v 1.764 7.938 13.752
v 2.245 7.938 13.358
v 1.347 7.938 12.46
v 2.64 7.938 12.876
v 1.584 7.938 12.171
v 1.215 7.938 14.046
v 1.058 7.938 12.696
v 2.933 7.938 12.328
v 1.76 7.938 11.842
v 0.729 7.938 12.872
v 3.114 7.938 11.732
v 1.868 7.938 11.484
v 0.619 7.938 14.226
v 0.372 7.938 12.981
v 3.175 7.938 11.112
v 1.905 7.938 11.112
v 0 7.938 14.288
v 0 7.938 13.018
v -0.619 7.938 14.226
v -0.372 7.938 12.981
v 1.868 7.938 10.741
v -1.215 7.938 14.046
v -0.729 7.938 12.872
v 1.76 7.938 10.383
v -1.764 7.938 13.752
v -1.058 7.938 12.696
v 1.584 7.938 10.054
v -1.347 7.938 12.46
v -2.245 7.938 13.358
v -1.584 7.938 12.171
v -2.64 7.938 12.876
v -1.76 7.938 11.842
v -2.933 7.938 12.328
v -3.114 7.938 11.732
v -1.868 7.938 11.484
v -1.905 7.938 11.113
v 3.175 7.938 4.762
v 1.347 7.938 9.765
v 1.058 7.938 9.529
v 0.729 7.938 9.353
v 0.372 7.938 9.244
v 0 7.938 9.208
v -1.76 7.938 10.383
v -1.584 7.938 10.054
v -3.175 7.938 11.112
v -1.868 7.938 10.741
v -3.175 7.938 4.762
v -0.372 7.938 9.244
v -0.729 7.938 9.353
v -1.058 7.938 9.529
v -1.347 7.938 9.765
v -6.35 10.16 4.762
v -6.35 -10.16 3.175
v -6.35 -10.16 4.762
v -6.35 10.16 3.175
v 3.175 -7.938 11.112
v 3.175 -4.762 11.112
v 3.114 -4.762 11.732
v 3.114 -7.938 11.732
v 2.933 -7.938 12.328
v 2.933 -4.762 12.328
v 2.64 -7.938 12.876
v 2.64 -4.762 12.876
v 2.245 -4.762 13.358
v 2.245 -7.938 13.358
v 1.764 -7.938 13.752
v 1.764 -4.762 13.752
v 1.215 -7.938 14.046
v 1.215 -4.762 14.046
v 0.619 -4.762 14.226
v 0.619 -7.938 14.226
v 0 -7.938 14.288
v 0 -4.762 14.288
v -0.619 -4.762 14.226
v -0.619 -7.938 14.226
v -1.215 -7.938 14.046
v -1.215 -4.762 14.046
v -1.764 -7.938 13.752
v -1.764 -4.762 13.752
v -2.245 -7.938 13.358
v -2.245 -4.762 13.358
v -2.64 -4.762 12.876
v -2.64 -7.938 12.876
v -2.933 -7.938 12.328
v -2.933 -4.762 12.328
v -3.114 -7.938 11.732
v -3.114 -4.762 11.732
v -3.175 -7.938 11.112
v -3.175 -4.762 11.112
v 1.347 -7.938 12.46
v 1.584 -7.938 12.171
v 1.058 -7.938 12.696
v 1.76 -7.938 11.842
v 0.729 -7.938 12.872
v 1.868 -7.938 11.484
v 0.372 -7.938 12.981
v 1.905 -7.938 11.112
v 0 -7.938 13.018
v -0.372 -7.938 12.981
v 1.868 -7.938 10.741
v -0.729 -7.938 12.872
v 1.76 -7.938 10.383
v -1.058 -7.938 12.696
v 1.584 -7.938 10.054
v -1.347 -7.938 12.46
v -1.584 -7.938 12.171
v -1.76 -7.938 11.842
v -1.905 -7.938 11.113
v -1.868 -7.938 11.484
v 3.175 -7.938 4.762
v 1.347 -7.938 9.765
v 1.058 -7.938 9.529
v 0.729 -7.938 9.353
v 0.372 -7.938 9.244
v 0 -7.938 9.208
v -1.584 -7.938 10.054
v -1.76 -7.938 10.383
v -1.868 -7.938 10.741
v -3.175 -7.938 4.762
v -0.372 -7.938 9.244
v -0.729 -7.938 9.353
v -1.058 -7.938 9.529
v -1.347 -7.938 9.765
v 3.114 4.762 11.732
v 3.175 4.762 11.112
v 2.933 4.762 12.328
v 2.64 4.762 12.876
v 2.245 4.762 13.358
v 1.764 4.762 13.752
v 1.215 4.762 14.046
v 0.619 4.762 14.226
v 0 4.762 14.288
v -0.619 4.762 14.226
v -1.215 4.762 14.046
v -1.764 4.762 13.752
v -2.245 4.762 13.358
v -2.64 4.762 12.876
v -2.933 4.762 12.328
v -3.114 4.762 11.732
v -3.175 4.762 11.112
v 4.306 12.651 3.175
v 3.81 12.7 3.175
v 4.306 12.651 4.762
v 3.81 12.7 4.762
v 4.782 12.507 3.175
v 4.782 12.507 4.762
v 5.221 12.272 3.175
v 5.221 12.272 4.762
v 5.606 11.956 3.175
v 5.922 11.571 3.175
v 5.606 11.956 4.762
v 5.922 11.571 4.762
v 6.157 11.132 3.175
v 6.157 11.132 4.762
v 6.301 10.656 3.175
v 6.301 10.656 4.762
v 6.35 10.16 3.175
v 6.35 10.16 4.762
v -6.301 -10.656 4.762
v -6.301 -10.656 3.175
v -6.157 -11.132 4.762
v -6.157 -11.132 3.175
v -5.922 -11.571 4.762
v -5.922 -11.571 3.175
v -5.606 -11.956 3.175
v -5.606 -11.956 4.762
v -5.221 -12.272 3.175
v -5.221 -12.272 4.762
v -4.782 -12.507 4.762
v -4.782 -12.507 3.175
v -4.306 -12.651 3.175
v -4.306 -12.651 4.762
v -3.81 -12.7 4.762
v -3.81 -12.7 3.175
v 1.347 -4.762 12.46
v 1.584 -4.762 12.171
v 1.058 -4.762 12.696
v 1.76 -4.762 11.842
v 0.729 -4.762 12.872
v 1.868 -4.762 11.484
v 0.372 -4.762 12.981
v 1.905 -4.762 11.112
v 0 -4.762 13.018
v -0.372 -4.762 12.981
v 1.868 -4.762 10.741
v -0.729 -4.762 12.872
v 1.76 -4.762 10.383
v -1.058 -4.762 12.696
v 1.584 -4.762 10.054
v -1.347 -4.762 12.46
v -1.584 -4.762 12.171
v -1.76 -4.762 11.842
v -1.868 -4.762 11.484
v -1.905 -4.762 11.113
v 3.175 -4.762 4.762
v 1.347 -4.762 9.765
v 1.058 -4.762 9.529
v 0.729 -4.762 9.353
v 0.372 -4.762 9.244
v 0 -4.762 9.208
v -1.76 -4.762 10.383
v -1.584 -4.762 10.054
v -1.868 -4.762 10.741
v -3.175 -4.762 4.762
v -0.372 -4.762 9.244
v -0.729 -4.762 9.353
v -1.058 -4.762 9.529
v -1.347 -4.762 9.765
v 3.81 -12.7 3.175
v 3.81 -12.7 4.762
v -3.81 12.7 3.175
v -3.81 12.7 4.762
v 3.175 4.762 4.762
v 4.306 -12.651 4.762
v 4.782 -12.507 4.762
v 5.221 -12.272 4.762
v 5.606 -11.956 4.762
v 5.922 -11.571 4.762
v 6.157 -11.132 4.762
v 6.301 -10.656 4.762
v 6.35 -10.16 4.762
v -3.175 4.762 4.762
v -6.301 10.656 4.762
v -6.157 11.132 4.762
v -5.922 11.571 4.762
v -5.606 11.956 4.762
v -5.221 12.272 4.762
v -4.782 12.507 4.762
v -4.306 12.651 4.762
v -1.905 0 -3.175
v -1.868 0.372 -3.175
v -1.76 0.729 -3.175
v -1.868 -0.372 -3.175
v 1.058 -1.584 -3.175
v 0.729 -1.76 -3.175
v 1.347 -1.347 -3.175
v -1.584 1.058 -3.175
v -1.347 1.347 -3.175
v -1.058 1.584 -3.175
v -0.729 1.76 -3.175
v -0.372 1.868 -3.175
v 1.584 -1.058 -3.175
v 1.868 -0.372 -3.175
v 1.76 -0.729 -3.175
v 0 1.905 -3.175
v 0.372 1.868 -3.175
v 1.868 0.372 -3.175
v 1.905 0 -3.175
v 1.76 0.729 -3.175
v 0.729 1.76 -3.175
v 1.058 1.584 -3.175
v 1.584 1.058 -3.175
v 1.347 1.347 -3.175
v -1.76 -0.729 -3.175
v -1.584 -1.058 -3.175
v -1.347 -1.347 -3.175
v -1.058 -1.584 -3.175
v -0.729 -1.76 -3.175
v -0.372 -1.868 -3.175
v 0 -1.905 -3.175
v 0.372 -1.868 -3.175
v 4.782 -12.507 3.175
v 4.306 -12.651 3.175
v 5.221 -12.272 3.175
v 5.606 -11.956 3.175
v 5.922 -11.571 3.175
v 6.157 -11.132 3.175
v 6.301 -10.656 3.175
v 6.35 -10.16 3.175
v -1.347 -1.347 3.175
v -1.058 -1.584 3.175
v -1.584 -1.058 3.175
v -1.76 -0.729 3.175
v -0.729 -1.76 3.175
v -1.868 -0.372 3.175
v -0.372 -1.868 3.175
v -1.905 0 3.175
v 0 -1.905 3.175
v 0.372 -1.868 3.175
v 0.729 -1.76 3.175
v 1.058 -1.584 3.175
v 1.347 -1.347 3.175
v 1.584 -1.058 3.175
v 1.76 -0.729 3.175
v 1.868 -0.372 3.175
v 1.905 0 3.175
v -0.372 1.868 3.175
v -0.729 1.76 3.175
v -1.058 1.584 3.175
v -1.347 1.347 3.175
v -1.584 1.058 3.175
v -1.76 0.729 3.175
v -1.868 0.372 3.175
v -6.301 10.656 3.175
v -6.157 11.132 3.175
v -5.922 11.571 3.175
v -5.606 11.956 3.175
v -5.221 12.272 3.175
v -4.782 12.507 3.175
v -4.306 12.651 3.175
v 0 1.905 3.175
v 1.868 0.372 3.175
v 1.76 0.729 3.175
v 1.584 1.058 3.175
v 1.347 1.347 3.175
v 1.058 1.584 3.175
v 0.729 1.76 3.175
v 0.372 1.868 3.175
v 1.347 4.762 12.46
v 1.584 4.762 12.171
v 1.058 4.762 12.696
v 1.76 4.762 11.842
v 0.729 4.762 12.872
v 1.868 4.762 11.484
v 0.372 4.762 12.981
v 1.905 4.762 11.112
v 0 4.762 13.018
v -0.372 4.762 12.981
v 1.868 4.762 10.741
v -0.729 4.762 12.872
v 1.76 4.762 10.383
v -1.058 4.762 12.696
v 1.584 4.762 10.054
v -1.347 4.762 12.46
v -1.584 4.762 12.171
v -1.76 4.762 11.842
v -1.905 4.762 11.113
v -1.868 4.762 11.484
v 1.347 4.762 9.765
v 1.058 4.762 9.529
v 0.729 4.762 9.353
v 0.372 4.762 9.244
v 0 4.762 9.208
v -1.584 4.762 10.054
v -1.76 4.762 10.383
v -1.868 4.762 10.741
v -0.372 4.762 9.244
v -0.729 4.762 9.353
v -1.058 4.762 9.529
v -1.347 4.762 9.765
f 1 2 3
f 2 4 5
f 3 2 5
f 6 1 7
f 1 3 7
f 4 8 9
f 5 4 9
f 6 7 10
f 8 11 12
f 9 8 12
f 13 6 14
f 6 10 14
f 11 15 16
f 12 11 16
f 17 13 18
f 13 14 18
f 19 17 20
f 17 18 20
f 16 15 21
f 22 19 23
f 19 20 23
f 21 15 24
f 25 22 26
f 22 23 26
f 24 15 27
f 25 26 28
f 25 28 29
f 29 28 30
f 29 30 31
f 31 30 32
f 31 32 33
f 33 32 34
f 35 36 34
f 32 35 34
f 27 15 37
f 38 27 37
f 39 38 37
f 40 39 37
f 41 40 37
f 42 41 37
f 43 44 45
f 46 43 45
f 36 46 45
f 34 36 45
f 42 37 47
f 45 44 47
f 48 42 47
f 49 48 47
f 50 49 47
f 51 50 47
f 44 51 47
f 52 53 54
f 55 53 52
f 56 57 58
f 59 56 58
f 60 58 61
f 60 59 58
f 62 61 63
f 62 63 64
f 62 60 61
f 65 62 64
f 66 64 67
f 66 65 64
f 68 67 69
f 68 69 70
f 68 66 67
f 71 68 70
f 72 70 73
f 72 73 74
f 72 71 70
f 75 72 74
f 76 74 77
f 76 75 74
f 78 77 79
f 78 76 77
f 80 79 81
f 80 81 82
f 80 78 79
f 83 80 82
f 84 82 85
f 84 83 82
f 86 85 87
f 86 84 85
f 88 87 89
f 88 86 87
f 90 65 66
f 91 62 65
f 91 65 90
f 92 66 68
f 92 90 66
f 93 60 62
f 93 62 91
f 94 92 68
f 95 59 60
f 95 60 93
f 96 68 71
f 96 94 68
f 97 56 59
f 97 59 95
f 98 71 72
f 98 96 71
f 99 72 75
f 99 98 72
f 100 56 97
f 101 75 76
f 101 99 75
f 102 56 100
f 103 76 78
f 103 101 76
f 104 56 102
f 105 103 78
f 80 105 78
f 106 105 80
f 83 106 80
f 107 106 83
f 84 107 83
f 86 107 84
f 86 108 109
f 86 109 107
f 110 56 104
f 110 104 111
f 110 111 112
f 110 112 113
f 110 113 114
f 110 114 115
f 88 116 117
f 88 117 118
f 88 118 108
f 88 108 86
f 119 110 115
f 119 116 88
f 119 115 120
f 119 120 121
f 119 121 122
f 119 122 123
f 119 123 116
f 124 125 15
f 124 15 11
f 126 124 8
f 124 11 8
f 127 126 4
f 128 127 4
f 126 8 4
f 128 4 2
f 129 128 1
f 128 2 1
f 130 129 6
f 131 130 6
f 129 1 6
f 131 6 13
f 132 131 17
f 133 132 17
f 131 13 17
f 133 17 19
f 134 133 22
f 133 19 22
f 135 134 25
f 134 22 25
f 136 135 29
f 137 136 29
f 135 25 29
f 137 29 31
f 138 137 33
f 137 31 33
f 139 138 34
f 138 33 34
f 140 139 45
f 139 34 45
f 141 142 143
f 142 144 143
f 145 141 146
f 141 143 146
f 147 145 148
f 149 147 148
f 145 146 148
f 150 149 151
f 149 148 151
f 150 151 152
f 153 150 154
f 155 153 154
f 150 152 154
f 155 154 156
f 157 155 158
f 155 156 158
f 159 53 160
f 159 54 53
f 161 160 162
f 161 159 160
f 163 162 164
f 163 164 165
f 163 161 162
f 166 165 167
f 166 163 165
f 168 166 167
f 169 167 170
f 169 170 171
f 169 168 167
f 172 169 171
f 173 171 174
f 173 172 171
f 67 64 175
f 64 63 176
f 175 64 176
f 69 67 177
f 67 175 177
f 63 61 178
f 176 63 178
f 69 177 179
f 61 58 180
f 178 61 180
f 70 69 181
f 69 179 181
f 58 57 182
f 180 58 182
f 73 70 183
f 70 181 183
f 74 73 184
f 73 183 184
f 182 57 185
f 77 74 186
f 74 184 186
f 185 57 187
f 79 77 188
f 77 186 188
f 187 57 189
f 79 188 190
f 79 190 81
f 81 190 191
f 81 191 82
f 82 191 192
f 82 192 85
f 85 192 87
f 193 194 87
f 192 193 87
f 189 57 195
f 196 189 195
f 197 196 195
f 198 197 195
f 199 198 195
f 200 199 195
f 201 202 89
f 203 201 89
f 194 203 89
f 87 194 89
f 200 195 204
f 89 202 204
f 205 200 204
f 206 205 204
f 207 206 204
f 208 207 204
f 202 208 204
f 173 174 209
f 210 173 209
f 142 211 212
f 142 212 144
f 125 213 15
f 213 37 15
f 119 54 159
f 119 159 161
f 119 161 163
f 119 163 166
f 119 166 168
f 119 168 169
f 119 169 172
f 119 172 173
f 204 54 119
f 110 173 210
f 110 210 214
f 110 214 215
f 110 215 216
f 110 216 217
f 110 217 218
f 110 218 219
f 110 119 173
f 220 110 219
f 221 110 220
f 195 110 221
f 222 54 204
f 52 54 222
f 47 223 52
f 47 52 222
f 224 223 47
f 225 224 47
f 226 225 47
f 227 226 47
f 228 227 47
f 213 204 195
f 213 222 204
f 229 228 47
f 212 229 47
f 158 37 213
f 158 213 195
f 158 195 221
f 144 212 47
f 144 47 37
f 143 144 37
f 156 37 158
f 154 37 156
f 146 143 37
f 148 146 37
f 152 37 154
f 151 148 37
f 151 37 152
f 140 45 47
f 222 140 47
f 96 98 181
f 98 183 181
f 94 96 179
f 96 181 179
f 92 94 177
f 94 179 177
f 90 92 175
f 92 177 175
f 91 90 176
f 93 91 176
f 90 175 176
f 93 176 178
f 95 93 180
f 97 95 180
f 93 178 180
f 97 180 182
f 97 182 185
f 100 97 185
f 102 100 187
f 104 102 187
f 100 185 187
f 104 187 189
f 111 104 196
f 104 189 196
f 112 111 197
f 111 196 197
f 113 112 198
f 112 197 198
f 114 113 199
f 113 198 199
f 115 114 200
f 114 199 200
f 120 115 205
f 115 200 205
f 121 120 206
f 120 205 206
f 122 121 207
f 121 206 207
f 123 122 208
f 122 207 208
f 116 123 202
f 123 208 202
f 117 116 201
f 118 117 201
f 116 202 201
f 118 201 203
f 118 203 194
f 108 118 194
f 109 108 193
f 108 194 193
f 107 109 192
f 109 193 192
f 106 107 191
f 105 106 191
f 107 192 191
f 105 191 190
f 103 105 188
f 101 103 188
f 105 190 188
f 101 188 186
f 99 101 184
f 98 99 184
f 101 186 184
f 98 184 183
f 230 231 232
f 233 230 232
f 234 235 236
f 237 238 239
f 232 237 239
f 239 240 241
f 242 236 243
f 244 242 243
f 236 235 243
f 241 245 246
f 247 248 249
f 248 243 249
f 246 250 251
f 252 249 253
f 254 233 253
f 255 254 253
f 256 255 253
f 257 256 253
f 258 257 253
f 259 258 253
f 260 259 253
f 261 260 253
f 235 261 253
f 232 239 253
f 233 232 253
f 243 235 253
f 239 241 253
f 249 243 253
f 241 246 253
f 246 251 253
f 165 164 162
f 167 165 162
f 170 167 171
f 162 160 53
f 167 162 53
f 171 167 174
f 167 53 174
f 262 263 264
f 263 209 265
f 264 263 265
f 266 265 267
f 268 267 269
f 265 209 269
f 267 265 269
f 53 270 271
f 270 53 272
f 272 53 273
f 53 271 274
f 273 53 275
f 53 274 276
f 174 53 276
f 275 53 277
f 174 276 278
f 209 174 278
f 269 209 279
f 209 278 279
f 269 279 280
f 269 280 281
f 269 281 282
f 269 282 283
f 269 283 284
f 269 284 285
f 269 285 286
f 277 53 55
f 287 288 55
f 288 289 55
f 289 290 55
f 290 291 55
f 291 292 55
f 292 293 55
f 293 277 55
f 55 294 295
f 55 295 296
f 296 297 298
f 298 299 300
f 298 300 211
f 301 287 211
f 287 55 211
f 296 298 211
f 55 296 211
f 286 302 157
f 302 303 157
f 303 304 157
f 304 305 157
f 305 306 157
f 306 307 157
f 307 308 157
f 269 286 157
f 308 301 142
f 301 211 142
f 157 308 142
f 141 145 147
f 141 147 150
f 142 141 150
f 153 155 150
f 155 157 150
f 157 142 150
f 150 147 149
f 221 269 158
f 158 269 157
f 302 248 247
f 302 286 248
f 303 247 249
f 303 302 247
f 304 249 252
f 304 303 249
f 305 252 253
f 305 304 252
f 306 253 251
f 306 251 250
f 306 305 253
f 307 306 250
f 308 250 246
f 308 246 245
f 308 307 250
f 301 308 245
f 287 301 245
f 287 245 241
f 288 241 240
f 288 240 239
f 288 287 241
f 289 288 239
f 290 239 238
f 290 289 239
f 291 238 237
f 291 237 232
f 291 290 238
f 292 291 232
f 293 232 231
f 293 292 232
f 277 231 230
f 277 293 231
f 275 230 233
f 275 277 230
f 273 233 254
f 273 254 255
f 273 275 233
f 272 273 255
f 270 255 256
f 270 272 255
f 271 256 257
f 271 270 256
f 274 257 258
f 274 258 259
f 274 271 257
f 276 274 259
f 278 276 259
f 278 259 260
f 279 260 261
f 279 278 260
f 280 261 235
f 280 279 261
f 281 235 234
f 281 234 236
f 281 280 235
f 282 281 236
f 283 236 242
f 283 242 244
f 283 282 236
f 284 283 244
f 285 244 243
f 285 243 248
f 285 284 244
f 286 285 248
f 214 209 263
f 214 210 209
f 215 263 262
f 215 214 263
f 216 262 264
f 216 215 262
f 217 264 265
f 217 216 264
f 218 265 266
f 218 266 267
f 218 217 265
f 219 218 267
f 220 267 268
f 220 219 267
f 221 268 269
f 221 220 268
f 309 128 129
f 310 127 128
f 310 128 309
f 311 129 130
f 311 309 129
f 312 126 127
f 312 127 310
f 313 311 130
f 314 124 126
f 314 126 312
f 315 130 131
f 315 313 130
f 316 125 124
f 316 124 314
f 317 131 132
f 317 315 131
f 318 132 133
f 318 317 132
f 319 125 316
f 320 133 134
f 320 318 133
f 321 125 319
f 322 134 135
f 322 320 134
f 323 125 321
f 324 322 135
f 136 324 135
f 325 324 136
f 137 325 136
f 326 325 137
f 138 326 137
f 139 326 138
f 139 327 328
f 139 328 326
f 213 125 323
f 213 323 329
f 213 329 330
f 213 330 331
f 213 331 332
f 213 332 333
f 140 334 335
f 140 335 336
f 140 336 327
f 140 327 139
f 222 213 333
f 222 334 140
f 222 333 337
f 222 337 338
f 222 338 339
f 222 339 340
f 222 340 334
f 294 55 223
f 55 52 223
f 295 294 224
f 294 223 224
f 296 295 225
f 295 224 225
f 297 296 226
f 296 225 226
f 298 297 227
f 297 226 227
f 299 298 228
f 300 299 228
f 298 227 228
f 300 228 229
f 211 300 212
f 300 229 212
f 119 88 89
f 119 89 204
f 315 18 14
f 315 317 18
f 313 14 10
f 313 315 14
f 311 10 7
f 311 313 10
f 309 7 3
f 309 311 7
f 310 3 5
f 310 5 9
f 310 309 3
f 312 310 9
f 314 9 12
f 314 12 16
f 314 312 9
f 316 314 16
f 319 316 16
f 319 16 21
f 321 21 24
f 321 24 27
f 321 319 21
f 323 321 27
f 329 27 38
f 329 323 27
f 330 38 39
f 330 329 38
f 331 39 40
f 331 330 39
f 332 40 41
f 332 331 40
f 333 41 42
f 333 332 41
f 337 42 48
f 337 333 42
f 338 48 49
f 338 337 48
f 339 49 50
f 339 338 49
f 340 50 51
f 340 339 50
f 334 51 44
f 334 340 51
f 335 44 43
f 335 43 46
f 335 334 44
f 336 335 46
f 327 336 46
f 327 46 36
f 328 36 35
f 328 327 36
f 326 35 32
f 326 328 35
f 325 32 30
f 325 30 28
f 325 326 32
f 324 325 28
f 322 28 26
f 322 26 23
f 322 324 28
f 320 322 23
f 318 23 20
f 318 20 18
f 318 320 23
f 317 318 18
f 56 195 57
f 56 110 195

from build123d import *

# Parameters (mm, degrees)
SKETCH2_R           = 1.905
BOSS_EXTRUDE1_DEPTH = 3.175
SKETCH3_W           = 12.7
SKETCH3_H           = 25.4
BOSS_EXTRUDE2_DEPTH = 1.5875
SKETCH5_R           = 1.905
BOSS_EXTRUDE3_DEPTH = 1.5875
FILLET1_R           = 2.54


with BuildPart() as part:
    # Sketch2 → Boss-Extrude1 (new, symmetric)
    with BuildSketch(Plane.XY):
        Circle(SKETCH2_R)
    extrude(amount=BOSS_EXTRUDE1_DEPTH, both=True)

    # Sketch3 → Boss-Extrude2 (add)
    with BuildSketch(Plane.XY.offset(3.175)):
        Rectangle(SKETCH3_W, SKETCH3_H)
    extrude(amount=BOSS_EXTRUDE2_DEPTH)

    # Sketch5 → Boss-Extrude3 (add, symmetric)
    with BuildSketch(Plane(origin=(0, 6.35, 0), x_dir=(1, 0, 0), z_dir=(0, 1, 0))):
        with BuildLine():
            Line((-3.175, -4.7625), (3.175, -4.7625))
            Line((3.175, -4.7625), (3.175, -11.1125))
            ThreePointArc((3.175, -11.1125), (0, -14.2875), (-3.175, -11.1125))
            Line((-3.175, -11.1125), (-3.175, -4.7625))
        make_face()
        with Locations(Location((0, -11.1125, 0), (0, 0, 270))):
            Circle(SKETCH5_R, mode=Mode.SUBTRACT)
    boss_extrude3 = extrude(amount=BOSS_EXTRUDE3_DEPTH, both=True)

    # Mirror1: Boss-Extrude3 across plane
    add(boss_extrude3.mirror(Plane.ZX))

    # Fillet1
    fillet1_edges = [part.edges().sort_by_distance(p)[0] for p in [
        (6.35, -12.7, 3.96875),
        (6.35, 12.7, 3.96875),
        (-6.35, 12.7, 3.96875),
        (-6.35, -12.7, 3.96875),
    ]]
    fillet(fillet1_edges, radius=FILLET1_R)


solid = part.part
